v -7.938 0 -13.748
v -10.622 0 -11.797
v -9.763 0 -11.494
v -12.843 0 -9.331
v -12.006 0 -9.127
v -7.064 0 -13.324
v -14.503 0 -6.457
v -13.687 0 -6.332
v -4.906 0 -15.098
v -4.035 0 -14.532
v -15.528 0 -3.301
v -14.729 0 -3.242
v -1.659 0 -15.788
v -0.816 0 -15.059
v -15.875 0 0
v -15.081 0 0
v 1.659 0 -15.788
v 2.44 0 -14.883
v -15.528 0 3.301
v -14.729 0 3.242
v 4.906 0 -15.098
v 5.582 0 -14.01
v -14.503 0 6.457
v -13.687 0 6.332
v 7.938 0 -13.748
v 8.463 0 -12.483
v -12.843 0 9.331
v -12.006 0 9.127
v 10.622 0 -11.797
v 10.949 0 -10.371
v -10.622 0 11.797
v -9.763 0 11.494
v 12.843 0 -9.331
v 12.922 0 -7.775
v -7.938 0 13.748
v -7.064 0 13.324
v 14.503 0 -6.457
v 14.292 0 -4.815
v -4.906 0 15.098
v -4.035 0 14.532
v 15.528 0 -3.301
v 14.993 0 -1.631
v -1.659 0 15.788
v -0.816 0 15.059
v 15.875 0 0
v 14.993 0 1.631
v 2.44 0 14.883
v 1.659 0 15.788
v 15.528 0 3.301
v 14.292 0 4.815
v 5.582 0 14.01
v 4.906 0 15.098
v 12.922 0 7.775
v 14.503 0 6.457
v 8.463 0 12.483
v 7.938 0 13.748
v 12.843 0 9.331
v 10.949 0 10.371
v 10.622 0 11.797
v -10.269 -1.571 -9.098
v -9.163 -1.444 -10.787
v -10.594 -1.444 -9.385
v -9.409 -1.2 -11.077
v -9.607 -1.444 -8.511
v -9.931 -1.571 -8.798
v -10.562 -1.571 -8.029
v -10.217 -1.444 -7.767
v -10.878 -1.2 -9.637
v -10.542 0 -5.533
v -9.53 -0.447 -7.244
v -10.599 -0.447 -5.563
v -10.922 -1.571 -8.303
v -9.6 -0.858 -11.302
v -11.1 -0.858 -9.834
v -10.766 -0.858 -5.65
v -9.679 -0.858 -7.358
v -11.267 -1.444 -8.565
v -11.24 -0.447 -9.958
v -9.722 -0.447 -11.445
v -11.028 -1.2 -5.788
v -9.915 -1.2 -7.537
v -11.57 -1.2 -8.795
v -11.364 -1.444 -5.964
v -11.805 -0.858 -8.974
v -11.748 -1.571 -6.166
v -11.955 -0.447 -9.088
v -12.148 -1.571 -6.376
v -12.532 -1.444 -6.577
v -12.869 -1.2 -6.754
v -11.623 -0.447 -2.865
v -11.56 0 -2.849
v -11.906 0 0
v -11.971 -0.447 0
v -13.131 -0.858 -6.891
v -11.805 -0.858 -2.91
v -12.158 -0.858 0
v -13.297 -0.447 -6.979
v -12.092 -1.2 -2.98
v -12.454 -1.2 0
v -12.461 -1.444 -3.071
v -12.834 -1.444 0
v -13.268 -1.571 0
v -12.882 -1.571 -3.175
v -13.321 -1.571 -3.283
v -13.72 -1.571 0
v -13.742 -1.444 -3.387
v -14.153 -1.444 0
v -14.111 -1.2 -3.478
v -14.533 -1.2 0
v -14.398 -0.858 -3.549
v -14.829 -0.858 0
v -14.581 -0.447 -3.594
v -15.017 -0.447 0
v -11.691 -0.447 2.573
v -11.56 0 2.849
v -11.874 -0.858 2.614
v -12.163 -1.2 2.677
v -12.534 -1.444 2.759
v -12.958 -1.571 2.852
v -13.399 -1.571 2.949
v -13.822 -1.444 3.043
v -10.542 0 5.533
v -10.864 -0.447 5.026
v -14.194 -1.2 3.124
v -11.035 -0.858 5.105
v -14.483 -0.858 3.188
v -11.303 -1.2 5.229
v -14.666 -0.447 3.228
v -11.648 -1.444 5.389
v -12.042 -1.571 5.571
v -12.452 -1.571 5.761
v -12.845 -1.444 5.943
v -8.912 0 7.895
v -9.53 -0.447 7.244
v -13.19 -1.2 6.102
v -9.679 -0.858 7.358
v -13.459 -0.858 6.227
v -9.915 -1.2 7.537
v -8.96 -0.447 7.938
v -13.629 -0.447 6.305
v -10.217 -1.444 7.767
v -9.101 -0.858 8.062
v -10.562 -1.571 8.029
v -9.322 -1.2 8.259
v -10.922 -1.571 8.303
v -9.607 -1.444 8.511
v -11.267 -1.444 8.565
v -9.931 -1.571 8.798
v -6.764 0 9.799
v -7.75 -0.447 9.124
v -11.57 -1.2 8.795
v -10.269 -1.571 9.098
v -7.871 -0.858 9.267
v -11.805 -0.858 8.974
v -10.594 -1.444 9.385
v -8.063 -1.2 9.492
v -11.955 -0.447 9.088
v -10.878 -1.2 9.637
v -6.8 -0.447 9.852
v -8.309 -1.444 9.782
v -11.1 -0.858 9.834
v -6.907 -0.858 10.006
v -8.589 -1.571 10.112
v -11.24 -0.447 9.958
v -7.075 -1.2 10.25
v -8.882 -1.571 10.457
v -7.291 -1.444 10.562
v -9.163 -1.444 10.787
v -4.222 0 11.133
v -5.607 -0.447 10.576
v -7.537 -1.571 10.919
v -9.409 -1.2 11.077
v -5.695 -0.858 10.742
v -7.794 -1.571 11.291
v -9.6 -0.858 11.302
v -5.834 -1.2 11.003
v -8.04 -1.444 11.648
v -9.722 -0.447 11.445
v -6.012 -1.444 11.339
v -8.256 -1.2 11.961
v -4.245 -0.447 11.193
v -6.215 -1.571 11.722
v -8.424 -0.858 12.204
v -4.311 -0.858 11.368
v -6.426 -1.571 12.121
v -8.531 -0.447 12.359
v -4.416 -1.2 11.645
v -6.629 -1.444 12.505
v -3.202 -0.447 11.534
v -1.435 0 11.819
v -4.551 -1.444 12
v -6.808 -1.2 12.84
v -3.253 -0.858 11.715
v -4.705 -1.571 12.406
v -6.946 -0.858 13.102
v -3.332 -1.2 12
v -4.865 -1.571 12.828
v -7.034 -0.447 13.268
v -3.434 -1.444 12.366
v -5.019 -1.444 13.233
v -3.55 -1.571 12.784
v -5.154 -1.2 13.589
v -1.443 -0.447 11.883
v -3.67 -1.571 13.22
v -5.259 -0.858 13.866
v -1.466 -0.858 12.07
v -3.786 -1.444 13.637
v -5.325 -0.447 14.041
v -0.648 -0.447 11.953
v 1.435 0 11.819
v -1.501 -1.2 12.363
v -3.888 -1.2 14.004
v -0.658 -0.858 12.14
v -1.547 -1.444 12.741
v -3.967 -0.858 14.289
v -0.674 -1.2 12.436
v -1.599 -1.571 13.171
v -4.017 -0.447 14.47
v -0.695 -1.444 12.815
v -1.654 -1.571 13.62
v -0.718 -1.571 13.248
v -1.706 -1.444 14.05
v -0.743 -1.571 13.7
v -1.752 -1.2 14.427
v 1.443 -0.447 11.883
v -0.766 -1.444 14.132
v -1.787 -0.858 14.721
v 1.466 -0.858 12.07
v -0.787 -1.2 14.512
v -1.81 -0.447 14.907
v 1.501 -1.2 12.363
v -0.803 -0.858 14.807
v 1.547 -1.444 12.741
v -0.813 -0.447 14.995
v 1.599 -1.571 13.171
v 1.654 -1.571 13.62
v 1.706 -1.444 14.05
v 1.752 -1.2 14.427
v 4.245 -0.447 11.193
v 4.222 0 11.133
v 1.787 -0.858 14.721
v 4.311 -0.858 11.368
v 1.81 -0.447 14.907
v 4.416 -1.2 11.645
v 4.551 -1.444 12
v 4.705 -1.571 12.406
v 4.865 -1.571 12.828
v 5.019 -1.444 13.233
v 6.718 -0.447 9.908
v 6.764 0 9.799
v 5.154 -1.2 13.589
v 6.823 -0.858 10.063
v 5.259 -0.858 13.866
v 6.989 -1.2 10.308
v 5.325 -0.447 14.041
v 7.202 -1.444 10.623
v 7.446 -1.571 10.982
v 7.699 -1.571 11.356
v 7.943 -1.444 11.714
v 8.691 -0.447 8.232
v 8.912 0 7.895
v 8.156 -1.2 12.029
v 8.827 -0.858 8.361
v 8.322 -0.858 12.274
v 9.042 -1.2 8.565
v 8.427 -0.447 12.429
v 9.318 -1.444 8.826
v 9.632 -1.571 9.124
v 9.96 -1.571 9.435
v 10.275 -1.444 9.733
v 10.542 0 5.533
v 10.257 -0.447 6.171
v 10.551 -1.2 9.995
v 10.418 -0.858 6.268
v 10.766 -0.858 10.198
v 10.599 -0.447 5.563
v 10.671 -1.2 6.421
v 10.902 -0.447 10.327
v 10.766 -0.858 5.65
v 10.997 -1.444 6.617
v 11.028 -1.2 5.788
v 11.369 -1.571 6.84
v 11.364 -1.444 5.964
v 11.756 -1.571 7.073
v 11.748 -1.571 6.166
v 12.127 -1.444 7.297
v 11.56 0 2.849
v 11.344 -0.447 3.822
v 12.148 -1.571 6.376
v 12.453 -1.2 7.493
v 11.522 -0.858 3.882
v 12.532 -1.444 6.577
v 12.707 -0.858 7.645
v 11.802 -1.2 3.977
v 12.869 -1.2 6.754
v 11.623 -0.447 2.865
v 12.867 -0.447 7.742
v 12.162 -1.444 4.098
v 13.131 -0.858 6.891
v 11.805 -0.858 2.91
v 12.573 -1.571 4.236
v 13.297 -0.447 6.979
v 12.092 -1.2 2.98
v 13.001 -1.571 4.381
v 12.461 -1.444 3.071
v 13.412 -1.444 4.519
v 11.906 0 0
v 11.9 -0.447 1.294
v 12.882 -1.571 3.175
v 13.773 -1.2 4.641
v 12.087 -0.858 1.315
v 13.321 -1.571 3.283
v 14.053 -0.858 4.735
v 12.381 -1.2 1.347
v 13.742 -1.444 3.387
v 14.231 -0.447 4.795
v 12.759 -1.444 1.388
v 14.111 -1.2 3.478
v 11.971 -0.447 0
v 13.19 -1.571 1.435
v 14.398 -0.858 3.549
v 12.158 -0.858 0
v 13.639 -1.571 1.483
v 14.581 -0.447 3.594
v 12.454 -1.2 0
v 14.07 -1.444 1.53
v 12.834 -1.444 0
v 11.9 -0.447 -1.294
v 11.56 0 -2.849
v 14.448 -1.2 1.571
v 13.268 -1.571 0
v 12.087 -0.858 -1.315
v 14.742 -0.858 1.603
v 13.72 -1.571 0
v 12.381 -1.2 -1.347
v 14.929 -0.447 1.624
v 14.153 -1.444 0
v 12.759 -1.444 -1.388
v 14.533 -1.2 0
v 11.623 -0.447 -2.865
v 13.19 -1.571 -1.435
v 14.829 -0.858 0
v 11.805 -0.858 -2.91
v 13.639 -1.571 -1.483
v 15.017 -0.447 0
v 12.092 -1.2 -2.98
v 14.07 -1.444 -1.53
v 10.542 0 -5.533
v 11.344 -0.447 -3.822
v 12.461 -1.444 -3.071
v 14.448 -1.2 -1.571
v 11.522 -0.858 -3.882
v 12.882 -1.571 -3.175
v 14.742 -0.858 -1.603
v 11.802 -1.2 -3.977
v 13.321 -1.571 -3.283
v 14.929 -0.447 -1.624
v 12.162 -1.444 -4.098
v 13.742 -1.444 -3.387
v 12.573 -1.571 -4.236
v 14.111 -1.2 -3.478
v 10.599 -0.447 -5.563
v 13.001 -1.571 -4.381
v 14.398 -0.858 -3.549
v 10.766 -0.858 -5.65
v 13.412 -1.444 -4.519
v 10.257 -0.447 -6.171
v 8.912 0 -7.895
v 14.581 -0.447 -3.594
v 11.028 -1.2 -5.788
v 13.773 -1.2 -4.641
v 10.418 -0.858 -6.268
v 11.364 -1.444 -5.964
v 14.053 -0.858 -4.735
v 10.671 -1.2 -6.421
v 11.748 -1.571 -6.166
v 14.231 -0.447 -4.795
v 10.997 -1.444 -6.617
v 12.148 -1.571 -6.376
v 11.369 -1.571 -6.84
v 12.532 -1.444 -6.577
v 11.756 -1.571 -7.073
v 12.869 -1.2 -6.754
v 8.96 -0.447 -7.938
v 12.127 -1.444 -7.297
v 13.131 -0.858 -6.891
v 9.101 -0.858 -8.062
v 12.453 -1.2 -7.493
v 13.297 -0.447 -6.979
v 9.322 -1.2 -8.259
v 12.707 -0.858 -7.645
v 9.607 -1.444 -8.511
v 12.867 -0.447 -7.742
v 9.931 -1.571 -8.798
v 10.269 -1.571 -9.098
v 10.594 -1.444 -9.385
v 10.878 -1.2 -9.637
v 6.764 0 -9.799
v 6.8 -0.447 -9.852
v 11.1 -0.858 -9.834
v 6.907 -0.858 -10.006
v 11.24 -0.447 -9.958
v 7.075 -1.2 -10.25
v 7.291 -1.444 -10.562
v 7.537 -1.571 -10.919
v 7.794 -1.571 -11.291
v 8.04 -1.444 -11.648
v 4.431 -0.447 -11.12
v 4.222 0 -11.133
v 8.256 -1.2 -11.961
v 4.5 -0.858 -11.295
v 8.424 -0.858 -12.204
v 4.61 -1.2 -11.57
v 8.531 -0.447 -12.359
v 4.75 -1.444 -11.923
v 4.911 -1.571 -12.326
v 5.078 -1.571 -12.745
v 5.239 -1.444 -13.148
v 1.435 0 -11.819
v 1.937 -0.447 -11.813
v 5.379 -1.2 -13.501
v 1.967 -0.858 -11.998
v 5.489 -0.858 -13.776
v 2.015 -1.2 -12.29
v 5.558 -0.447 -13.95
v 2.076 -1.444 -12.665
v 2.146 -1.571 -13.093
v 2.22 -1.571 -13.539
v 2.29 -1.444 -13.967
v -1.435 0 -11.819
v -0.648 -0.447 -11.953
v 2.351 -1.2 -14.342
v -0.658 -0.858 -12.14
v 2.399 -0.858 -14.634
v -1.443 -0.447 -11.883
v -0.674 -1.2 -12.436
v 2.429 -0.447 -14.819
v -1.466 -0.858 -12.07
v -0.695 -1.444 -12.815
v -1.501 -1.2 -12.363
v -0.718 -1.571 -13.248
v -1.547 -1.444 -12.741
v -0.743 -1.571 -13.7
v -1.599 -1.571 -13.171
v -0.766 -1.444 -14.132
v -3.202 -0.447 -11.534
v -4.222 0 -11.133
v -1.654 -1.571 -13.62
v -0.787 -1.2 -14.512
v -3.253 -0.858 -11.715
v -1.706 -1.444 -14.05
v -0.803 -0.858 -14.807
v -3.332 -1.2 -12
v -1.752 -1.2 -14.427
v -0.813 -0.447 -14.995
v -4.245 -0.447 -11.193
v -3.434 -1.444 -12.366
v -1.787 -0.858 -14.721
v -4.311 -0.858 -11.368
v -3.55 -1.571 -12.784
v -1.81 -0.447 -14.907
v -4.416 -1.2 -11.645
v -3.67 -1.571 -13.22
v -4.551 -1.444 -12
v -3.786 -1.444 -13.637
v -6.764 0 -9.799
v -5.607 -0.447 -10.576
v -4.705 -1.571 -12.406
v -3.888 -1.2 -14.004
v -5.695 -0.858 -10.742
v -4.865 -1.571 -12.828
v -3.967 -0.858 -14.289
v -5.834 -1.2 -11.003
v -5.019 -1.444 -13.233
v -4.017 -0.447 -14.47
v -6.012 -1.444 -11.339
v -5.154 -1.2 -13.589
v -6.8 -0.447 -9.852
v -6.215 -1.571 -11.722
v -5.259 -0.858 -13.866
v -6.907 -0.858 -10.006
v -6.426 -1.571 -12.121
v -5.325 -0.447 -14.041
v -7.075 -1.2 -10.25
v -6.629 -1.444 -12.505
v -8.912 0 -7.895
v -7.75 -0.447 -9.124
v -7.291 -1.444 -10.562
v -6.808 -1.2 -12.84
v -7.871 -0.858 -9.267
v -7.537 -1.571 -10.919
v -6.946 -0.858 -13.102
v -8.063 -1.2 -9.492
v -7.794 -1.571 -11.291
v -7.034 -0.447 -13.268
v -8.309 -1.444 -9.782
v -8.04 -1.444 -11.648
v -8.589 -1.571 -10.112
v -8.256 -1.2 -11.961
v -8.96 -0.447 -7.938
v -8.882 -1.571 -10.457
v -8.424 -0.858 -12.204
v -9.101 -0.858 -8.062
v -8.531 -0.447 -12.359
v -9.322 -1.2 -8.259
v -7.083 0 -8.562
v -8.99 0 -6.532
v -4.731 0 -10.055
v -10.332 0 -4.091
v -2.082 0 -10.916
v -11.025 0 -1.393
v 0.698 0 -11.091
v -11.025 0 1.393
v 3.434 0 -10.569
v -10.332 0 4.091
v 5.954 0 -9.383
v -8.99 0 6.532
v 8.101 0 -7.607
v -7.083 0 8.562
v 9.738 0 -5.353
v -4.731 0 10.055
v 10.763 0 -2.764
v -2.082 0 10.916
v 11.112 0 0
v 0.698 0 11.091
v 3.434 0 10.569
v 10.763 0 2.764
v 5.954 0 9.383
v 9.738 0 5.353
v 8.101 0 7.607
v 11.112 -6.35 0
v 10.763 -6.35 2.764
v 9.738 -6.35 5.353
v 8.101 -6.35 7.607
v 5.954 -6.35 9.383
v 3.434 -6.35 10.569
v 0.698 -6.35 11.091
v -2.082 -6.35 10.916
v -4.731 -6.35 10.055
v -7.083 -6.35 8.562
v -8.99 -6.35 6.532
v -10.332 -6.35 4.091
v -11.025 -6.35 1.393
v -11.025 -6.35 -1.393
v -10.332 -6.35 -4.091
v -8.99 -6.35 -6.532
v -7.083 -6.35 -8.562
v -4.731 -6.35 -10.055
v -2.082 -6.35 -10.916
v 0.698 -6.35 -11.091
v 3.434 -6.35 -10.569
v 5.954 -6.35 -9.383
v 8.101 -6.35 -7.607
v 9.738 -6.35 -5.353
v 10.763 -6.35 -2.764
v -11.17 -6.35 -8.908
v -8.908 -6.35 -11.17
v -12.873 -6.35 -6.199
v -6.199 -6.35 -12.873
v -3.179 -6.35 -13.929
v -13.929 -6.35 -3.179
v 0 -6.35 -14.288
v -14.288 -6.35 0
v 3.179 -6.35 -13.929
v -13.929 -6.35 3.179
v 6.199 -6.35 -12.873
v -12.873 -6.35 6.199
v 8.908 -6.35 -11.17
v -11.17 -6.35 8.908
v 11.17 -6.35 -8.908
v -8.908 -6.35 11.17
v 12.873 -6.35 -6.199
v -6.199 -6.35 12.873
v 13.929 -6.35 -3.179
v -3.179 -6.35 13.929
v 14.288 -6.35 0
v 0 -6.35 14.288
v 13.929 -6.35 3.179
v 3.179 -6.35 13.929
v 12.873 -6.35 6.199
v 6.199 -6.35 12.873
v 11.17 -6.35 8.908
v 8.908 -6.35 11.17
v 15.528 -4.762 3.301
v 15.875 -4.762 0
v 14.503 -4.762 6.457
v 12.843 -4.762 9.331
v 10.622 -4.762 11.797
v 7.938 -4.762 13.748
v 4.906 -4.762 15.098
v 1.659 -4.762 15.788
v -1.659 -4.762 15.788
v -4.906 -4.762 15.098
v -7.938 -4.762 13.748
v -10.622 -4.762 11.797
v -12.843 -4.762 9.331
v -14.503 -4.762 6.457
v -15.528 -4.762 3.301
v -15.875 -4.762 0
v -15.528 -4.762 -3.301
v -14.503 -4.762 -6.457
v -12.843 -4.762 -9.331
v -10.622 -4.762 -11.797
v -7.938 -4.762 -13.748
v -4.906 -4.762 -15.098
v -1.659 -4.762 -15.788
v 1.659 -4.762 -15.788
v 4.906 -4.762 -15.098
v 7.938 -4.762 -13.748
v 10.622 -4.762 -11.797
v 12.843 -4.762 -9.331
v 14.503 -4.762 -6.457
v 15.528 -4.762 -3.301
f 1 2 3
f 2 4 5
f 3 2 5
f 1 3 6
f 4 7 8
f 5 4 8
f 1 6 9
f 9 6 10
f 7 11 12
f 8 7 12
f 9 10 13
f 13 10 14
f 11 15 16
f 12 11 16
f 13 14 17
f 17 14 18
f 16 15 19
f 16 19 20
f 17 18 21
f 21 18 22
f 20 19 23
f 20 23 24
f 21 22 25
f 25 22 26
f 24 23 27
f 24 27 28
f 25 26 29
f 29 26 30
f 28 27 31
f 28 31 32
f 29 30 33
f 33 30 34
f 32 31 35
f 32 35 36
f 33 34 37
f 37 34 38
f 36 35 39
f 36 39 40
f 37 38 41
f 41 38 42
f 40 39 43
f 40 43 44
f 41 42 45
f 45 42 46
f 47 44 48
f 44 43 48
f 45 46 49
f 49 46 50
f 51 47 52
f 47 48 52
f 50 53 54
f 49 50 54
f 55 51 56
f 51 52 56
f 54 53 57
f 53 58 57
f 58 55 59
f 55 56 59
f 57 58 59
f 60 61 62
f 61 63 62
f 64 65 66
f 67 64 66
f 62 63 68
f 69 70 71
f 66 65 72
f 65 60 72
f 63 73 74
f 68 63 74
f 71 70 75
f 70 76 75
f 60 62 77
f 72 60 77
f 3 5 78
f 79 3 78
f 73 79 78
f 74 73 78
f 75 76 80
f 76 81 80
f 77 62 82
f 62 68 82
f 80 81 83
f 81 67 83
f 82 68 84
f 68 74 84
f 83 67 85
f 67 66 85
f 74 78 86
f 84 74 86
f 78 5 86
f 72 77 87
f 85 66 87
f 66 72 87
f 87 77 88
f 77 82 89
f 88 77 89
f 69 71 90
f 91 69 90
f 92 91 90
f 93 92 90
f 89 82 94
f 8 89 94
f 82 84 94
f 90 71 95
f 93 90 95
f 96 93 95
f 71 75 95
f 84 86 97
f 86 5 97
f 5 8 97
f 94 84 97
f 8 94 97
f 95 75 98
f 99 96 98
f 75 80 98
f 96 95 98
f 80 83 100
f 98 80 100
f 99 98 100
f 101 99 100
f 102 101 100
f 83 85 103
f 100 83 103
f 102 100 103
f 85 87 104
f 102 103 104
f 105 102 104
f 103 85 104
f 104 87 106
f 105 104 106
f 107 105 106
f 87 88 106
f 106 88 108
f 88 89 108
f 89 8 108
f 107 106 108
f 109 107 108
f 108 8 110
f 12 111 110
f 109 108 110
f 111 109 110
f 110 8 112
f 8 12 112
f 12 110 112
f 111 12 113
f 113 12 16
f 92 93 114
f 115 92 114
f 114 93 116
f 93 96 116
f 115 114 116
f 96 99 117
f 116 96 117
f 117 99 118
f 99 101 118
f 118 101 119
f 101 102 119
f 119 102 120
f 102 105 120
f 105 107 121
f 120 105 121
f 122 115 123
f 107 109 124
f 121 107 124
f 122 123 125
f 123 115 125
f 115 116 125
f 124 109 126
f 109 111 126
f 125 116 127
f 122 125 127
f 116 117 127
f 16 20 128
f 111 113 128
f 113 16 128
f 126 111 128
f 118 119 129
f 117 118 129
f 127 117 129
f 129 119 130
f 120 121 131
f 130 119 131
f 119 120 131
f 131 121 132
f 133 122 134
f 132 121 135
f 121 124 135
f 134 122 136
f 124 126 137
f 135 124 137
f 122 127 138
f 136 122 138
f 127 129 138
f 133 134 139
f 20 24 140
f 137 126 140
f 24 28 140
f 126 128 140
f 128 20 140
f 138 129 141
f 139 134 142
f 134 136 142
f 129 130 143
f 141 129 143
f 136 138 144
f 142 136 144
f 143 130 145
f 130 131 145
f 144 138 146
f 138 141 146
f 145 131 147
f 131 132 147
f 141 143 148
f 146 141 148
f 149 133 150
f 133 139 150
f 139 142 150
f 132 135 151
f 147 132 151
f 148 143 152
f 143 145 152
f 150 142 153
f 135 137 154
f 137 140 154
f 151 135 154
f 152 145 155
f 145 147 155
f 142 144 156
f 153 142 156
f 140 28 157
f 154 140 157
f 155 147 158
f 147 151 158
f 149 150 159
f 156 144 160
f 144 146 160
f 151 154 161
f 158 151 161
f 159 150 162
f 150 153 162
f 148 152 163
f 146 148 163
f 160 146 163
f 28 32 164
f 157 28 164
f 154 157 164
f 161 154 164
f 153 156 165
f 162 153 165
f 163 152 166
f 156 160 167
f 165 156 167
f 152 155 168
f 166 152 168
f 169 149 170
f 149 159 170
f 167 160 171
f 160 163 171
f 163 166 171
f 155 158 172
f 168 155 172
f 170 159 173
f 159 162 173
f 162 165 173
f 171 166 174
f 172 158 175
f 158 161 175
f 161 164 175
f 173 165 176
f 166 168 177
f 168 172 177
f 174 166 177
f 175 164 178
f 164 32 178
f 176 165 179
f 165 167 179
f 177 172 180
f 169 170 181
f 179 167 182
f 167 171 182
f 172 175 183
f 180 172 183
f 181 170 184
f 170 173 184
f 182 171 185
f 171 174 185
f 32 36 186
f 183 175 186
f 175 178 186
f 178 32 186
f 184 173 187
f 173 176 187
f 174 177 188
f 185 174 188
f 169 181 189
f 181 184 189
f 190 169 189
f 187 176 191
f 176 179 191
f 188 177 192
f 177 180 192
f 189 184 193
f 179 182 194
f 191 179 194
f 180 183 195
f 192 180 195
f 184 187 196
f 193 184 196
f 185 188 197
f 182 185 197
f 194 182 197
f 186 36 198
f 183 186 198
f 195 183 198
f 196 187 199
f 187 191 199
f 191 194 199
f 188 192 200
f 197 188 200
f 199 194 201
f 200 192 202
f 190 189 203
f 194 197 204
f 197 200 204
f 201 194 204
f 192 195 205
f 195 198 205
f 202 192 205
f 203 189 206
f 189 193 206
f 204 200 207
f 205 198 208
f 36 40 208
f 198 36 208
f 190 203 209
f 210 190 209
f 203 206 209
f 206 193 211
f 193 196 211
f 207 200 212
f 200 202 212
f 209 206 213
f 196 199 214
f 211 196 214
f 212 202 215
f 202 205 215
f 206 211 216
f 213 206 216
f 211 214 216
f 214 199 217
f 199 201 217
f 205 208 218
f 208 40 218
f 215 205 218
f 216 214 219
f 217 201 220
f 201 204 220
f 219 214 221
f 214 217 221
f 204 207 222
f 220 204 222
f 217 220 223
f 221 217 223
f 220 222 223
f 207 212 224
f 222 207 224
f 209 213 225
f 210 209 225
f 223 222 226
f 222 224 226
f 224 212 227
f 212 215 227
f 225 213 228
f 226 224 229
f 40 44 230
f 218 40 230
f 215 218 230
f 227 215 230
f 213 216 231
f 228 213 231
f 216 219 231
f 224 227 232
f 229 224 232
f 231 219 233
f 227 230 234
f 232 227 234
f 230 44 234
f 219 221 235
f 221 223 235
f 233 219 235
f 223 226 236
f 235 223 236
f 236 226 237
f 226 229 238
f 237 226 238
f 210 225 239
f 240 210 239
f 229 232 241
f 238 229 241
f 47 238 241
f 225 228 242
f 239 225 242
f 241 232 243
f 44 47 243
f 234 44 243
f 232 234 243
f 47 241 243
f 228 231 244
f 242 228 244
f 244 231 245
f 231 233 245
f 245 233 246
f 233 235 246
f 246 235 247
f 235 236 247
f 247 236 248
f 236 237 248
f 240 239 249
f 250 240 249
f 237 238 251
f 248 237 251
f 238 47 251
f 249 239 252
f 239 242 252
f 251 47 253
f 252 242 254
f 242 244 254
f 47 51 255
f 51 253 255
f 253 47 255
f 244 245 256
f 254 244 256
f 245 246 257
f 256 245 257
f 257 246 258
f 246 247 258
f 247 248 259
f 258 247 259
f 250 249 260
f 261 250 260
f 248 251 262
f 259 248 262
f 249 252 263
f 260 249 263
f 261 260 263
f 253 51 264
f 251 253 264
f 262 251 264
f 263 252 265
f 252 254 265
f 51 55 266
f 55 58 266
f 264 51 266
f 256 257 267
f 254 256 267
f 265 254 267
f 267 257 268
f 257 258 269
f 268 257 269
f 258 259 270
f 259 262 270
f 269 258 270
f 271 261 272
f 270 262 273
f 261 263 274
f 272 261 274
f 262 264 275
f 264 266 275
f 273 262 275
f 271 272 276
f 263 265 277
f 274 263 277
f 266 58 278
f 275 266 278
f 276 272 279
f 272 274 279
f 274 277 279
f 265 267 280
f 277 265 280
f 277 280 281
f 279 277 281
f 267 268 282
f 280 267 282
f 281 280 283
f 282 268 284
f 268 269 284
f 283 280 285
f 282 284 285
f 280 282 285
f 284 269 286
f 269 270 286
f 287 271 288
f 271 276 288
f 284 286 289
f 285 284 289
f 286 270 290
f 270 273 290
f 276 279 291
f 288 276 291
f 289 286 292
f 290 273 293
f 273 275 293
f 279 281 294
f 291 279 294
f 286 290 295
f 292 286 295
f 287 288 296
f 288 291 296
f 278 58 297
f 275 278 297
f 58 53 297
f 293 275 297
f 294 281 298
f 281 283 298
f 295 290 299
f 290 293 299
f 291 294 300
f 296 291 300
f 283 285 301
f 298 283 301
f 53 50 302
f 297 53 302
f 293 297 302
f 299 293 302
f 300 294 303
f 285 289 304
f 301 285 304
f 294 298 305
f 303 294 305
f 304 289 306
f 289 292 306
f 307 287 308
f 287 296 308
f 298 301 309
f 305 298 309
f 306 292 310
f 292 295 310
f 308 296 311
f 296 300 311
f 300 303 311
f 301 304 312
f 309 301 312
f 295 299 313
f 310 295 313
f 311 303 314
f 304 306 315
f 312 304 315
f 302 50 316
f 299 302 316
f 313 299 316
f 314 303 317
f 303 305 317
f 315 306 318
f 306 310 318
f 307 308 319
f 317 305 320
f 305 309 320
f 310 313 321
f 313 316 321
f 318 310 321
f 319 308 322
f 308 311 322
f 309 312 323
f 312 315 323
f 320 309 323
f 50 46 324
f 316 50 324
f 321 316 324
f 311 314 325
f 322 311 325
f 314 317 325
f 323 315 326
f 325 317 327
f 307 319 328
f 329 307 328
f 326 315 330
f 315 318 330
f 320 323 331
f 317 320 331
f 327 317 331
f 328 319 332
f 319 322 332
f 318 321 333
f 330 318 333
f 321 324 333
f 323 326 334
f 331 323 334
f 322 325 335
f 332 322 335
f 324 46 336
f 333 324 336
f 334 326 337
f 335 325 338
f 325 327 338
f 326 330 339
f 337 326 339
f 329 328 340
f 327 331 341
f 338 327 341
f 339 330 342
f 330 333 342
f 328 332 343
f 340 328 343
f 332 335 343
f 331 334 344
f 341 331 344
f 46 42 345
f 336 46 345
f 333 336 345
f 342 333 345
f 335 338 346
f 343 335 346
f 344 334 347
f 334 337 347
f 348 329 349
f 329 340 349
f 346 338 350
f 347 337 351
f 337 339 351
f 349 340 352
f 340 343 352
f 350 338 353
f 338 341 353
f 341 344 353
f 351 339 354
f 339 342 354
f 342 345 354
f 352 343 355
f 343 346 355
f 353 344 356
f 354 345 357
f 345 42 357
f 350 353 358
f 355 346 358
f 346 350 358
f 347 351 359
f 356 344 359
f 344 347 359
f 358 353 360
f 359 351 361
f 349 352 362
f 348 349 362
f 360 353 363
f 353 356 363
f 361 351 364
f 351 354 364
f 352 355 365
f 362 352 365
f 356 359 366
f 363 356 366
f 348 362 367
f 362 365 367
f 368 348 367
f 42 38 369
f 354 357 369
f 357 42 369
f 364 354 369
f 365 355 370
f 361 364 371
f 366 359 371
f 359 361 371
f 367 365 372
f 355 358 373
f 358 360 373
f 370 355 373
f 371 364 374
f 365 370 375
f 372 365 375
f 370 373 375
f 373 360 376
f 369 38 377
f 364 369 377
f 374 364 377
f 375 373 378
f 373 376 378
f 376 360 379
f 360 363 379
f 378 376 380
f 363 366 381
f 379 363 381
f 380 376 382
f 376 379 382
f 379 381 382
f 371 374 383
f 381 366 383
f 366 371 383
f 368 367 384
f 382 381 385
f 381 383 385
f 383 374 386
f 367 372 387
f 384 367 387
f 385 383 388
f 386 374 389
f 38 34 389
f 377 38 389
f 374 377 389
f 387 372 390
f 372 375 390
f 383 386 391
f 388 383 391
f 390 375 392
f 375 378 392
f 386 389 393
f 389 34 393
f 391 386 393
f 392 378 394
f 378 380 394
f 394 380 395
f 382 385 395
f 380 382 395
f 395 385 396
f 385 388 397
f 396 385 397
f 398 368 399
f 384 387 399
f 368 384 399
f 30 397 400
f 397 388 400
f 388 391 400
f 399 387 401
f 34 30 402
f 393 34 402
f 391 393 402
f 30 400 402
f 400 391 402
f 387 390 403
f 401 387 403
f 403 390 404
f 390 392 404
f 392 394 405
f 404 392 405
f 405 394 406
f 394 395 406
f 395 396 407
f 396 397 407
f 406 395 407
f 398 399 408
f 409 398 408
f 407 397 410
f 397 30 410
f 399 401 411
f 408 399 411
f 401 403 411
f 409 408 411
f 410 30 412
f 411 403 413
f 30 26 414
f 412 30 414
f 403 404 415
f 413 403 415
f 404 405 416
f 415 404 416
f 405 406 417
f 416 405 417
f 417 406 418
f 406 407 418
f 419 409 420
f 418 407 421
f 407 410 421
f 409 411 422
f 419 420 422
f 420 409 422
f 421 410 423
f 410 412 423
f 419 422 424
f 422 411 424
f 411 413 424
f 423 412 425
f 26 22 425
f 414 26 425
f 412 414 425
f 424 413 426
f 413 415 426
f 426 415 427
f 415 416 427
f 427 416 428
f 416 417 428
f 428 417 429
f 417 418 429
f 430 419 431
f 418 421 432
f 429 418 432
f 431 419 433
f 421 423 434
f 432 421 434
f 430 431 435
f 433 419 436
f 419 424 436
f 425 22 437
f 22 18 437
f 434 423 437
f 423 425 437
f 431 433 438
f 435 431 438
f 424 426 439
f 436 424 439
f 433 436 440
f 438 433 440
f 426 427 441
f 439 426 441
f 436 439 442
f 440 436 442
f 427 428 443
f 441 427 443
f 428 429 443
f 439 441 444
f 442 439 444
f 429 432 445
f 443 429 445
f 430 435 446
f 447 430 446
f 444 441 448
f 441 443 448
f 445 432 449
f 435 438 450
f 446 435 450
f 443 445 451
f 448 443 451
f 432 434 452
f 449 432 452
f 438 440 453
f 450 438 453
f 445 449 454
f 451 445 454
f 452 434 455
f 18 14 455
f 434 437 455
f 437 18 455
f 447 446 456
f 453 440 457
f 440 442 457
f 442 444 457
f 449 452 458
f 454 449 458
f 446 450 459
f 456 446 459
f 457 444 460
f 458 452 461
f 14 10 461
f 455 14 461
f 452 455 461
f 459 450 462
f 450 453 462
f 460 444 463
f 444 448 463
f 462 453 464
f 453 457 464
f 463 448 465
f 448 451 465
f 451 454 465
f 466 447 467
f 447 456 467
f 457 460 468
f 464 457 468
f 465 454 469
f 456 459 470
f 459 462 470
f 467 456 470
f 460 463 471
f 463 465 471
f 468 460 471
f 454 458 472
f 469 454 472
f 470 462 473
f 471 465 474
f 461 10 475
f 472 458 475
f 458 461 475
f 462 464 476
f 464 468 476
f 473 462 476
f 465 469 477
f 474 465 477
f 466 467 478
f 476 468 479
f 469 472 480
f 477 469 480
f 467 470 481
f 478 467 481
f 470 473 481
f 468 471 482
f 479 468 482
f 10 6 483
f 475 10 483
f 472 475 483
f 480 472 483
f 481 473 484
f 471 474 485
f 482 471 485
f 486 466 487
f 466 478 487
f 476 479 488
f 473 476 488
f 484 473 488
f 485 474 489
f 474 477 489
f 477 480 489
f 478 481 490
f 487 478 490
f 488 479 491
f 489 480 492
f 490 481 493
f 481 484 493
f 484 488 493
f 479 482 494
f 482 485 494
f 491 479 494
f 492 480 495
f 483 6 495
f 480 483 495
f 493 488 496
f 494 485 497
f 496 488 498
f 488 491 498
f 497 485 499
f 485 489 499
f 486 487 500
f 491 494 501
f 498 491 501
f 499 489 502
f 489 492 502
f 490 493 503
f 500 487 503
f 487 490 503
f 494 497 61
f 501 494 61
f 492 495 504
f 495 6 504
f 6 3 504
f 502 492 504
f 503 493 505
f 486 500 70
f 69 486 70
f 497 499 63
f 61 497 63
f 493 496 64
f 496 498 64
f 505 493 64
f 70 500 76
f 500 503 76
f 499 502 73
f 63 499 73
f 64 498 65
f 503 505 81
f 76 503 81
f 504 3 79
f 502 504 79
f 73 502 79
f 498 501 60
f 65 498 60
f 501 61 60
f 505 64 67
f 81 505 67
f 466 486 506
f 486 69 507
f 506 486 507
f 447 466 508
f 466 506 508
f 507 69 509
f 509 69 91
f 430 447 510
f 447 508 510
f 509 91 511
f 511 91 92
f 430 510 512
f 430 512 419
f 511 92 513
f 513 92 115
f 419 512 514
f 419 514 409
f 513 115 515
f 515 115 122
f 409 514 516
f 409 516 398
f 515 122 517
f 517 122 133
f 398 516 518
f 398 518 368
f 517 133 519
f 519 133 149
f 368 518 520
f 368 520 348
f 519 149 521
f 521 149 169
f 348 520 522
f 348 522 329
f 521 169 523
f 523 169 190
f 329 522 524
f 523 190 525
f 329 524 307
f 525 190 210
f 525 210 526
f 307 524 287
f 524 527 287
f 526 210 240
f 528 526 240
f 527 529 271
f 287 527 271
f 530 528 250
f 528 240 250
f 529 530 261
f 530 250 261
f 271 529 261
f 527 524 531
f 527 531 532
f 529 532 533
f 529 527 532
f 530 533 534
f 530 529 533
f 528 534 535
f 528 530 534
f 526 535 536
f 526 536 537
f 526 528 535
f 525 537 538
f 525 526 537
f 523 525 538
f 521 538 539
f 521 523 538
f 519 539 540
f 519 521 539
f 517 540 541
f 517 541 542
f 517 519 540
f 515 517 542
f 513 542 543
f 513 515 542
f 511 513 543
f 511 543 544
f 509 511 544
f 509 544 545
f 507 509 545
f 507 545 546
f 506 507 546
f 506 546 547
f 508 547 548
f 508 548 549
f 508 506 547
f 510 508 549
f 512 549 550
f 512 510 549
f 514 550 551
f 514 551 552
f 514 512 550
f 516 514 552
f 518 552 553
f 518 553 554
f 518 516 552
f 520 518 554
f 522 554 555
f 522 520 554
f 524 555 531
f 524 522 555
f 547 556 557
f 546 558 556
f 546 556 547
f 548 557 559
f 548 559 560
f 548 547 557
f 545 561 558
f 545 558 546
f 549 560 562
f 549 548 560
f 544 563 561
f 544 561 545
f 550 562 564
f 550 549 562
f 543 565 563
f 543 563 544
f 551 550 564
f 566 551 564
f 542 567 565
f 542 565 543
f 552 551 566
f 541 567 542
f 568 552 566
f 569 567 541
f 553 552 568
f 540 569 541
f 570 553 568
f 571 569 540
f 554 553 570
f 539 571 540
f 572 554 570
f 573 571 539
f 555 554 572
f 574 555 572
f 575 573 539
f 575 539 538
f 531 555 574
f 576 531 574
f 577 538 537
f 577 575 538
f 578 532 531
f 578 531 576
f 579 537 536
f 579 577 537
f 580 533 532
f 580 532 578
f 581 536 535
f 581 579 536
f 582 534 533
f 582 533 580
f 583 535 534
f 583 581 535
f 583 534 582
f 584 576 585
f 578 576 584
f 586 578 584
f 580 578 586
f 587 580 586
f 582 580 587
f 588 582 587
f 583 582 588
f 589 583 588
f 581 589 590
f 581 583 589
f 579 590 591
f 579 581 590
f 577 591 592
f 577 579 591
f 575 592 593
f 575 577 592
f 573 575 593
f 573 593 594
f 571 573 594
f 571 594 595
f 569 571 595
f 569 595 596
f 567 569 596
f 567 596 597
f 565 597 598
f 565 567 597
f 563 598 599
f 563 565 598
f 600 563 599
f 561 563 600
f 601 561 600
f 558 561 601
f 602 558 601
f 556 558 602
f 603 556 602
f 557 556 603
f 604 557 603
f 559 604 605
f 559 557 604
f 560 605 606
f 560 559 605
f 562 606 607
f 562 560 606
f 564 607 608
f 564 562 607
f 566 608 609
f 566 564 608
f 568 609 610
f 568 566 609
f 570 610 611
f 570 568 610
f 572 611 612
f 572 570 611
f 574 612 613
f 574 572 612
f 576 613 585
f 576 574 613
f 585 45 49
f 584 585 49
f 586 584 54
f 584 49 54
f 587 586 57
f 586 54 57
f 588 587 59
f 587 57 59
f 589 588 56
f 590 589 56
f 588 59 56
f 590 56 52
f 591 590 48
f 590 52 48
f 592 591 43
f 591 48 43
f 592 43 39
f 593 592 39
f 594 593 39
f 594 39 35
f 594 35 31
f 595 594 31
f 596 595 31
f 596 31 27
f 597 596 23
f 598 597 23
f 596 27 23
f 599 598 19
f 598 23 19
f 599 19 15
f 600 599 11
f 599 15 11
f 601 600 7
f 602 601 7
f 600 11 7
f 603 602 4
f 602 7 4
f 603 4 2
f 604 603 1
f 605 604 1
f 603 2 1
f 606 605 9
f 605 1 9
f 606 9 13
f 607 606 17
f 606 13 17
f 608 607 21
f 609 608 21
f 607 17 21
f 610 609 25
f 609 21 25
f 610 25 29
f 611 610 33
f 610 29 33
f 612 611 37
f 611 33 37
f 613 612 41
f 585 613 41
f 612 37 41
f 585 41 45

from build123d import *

# Parameters (mm, degrees)
F0_R     = 15.875
F0_R_2   = 11.1125
F1_DEPTH = 6.35
F2_SIZE  = 1.5875


with BuildPart() as f1:
    # F0 (on Front) → F1 (new body)
    with BuildSketch(Plane.XZ):
        Circle(F0_R)
        Circle(F0_R_2, mode=Mode.SUBTRACT)
    extrude(amount=F1_DEPTH)

    # F2
    f2_edges = [f1.edges().sort_by_distance(p)[0] for p in [
        (-15.875, -6.35, 0),
    ]]
    chamfer(f2_edges, length=F2_SIZE)

    # F5: sweep along a path in F3
    with BuildLine(Plane(origin=(0, 0, 0), x_dir=(-1, 0, 0), z_dir=(0, 1, 0))) as f5_path:
        CenterArc((0, 0), 11.90625, 0, 360)
    # F4 (on Right) → F5 (sweep, cut)
    with BuildSketch(Plane.YZ):
        with BuildLine():
            ThreePointArc((1.5875, 13.49375), (1.122532, 14.616282), (0, 15.08125))
            Line((0, 15.08125), (0, 11.90625))
            ThreePointArc((0, 11.90625), (1.122532, 12.371218), (1.5875, 13.49375))
        make_face()
        with BuildLine():
            Line((0, 11.90625), (0, 15.08125))
            ThreePointArc((0, 15.08125), (-1.5875, 13.49375), (0, 11.90625))
        make_face()
    sweep(path=f5_path.line, mode=Mode.SUBTRACT)


solid = f1.part
